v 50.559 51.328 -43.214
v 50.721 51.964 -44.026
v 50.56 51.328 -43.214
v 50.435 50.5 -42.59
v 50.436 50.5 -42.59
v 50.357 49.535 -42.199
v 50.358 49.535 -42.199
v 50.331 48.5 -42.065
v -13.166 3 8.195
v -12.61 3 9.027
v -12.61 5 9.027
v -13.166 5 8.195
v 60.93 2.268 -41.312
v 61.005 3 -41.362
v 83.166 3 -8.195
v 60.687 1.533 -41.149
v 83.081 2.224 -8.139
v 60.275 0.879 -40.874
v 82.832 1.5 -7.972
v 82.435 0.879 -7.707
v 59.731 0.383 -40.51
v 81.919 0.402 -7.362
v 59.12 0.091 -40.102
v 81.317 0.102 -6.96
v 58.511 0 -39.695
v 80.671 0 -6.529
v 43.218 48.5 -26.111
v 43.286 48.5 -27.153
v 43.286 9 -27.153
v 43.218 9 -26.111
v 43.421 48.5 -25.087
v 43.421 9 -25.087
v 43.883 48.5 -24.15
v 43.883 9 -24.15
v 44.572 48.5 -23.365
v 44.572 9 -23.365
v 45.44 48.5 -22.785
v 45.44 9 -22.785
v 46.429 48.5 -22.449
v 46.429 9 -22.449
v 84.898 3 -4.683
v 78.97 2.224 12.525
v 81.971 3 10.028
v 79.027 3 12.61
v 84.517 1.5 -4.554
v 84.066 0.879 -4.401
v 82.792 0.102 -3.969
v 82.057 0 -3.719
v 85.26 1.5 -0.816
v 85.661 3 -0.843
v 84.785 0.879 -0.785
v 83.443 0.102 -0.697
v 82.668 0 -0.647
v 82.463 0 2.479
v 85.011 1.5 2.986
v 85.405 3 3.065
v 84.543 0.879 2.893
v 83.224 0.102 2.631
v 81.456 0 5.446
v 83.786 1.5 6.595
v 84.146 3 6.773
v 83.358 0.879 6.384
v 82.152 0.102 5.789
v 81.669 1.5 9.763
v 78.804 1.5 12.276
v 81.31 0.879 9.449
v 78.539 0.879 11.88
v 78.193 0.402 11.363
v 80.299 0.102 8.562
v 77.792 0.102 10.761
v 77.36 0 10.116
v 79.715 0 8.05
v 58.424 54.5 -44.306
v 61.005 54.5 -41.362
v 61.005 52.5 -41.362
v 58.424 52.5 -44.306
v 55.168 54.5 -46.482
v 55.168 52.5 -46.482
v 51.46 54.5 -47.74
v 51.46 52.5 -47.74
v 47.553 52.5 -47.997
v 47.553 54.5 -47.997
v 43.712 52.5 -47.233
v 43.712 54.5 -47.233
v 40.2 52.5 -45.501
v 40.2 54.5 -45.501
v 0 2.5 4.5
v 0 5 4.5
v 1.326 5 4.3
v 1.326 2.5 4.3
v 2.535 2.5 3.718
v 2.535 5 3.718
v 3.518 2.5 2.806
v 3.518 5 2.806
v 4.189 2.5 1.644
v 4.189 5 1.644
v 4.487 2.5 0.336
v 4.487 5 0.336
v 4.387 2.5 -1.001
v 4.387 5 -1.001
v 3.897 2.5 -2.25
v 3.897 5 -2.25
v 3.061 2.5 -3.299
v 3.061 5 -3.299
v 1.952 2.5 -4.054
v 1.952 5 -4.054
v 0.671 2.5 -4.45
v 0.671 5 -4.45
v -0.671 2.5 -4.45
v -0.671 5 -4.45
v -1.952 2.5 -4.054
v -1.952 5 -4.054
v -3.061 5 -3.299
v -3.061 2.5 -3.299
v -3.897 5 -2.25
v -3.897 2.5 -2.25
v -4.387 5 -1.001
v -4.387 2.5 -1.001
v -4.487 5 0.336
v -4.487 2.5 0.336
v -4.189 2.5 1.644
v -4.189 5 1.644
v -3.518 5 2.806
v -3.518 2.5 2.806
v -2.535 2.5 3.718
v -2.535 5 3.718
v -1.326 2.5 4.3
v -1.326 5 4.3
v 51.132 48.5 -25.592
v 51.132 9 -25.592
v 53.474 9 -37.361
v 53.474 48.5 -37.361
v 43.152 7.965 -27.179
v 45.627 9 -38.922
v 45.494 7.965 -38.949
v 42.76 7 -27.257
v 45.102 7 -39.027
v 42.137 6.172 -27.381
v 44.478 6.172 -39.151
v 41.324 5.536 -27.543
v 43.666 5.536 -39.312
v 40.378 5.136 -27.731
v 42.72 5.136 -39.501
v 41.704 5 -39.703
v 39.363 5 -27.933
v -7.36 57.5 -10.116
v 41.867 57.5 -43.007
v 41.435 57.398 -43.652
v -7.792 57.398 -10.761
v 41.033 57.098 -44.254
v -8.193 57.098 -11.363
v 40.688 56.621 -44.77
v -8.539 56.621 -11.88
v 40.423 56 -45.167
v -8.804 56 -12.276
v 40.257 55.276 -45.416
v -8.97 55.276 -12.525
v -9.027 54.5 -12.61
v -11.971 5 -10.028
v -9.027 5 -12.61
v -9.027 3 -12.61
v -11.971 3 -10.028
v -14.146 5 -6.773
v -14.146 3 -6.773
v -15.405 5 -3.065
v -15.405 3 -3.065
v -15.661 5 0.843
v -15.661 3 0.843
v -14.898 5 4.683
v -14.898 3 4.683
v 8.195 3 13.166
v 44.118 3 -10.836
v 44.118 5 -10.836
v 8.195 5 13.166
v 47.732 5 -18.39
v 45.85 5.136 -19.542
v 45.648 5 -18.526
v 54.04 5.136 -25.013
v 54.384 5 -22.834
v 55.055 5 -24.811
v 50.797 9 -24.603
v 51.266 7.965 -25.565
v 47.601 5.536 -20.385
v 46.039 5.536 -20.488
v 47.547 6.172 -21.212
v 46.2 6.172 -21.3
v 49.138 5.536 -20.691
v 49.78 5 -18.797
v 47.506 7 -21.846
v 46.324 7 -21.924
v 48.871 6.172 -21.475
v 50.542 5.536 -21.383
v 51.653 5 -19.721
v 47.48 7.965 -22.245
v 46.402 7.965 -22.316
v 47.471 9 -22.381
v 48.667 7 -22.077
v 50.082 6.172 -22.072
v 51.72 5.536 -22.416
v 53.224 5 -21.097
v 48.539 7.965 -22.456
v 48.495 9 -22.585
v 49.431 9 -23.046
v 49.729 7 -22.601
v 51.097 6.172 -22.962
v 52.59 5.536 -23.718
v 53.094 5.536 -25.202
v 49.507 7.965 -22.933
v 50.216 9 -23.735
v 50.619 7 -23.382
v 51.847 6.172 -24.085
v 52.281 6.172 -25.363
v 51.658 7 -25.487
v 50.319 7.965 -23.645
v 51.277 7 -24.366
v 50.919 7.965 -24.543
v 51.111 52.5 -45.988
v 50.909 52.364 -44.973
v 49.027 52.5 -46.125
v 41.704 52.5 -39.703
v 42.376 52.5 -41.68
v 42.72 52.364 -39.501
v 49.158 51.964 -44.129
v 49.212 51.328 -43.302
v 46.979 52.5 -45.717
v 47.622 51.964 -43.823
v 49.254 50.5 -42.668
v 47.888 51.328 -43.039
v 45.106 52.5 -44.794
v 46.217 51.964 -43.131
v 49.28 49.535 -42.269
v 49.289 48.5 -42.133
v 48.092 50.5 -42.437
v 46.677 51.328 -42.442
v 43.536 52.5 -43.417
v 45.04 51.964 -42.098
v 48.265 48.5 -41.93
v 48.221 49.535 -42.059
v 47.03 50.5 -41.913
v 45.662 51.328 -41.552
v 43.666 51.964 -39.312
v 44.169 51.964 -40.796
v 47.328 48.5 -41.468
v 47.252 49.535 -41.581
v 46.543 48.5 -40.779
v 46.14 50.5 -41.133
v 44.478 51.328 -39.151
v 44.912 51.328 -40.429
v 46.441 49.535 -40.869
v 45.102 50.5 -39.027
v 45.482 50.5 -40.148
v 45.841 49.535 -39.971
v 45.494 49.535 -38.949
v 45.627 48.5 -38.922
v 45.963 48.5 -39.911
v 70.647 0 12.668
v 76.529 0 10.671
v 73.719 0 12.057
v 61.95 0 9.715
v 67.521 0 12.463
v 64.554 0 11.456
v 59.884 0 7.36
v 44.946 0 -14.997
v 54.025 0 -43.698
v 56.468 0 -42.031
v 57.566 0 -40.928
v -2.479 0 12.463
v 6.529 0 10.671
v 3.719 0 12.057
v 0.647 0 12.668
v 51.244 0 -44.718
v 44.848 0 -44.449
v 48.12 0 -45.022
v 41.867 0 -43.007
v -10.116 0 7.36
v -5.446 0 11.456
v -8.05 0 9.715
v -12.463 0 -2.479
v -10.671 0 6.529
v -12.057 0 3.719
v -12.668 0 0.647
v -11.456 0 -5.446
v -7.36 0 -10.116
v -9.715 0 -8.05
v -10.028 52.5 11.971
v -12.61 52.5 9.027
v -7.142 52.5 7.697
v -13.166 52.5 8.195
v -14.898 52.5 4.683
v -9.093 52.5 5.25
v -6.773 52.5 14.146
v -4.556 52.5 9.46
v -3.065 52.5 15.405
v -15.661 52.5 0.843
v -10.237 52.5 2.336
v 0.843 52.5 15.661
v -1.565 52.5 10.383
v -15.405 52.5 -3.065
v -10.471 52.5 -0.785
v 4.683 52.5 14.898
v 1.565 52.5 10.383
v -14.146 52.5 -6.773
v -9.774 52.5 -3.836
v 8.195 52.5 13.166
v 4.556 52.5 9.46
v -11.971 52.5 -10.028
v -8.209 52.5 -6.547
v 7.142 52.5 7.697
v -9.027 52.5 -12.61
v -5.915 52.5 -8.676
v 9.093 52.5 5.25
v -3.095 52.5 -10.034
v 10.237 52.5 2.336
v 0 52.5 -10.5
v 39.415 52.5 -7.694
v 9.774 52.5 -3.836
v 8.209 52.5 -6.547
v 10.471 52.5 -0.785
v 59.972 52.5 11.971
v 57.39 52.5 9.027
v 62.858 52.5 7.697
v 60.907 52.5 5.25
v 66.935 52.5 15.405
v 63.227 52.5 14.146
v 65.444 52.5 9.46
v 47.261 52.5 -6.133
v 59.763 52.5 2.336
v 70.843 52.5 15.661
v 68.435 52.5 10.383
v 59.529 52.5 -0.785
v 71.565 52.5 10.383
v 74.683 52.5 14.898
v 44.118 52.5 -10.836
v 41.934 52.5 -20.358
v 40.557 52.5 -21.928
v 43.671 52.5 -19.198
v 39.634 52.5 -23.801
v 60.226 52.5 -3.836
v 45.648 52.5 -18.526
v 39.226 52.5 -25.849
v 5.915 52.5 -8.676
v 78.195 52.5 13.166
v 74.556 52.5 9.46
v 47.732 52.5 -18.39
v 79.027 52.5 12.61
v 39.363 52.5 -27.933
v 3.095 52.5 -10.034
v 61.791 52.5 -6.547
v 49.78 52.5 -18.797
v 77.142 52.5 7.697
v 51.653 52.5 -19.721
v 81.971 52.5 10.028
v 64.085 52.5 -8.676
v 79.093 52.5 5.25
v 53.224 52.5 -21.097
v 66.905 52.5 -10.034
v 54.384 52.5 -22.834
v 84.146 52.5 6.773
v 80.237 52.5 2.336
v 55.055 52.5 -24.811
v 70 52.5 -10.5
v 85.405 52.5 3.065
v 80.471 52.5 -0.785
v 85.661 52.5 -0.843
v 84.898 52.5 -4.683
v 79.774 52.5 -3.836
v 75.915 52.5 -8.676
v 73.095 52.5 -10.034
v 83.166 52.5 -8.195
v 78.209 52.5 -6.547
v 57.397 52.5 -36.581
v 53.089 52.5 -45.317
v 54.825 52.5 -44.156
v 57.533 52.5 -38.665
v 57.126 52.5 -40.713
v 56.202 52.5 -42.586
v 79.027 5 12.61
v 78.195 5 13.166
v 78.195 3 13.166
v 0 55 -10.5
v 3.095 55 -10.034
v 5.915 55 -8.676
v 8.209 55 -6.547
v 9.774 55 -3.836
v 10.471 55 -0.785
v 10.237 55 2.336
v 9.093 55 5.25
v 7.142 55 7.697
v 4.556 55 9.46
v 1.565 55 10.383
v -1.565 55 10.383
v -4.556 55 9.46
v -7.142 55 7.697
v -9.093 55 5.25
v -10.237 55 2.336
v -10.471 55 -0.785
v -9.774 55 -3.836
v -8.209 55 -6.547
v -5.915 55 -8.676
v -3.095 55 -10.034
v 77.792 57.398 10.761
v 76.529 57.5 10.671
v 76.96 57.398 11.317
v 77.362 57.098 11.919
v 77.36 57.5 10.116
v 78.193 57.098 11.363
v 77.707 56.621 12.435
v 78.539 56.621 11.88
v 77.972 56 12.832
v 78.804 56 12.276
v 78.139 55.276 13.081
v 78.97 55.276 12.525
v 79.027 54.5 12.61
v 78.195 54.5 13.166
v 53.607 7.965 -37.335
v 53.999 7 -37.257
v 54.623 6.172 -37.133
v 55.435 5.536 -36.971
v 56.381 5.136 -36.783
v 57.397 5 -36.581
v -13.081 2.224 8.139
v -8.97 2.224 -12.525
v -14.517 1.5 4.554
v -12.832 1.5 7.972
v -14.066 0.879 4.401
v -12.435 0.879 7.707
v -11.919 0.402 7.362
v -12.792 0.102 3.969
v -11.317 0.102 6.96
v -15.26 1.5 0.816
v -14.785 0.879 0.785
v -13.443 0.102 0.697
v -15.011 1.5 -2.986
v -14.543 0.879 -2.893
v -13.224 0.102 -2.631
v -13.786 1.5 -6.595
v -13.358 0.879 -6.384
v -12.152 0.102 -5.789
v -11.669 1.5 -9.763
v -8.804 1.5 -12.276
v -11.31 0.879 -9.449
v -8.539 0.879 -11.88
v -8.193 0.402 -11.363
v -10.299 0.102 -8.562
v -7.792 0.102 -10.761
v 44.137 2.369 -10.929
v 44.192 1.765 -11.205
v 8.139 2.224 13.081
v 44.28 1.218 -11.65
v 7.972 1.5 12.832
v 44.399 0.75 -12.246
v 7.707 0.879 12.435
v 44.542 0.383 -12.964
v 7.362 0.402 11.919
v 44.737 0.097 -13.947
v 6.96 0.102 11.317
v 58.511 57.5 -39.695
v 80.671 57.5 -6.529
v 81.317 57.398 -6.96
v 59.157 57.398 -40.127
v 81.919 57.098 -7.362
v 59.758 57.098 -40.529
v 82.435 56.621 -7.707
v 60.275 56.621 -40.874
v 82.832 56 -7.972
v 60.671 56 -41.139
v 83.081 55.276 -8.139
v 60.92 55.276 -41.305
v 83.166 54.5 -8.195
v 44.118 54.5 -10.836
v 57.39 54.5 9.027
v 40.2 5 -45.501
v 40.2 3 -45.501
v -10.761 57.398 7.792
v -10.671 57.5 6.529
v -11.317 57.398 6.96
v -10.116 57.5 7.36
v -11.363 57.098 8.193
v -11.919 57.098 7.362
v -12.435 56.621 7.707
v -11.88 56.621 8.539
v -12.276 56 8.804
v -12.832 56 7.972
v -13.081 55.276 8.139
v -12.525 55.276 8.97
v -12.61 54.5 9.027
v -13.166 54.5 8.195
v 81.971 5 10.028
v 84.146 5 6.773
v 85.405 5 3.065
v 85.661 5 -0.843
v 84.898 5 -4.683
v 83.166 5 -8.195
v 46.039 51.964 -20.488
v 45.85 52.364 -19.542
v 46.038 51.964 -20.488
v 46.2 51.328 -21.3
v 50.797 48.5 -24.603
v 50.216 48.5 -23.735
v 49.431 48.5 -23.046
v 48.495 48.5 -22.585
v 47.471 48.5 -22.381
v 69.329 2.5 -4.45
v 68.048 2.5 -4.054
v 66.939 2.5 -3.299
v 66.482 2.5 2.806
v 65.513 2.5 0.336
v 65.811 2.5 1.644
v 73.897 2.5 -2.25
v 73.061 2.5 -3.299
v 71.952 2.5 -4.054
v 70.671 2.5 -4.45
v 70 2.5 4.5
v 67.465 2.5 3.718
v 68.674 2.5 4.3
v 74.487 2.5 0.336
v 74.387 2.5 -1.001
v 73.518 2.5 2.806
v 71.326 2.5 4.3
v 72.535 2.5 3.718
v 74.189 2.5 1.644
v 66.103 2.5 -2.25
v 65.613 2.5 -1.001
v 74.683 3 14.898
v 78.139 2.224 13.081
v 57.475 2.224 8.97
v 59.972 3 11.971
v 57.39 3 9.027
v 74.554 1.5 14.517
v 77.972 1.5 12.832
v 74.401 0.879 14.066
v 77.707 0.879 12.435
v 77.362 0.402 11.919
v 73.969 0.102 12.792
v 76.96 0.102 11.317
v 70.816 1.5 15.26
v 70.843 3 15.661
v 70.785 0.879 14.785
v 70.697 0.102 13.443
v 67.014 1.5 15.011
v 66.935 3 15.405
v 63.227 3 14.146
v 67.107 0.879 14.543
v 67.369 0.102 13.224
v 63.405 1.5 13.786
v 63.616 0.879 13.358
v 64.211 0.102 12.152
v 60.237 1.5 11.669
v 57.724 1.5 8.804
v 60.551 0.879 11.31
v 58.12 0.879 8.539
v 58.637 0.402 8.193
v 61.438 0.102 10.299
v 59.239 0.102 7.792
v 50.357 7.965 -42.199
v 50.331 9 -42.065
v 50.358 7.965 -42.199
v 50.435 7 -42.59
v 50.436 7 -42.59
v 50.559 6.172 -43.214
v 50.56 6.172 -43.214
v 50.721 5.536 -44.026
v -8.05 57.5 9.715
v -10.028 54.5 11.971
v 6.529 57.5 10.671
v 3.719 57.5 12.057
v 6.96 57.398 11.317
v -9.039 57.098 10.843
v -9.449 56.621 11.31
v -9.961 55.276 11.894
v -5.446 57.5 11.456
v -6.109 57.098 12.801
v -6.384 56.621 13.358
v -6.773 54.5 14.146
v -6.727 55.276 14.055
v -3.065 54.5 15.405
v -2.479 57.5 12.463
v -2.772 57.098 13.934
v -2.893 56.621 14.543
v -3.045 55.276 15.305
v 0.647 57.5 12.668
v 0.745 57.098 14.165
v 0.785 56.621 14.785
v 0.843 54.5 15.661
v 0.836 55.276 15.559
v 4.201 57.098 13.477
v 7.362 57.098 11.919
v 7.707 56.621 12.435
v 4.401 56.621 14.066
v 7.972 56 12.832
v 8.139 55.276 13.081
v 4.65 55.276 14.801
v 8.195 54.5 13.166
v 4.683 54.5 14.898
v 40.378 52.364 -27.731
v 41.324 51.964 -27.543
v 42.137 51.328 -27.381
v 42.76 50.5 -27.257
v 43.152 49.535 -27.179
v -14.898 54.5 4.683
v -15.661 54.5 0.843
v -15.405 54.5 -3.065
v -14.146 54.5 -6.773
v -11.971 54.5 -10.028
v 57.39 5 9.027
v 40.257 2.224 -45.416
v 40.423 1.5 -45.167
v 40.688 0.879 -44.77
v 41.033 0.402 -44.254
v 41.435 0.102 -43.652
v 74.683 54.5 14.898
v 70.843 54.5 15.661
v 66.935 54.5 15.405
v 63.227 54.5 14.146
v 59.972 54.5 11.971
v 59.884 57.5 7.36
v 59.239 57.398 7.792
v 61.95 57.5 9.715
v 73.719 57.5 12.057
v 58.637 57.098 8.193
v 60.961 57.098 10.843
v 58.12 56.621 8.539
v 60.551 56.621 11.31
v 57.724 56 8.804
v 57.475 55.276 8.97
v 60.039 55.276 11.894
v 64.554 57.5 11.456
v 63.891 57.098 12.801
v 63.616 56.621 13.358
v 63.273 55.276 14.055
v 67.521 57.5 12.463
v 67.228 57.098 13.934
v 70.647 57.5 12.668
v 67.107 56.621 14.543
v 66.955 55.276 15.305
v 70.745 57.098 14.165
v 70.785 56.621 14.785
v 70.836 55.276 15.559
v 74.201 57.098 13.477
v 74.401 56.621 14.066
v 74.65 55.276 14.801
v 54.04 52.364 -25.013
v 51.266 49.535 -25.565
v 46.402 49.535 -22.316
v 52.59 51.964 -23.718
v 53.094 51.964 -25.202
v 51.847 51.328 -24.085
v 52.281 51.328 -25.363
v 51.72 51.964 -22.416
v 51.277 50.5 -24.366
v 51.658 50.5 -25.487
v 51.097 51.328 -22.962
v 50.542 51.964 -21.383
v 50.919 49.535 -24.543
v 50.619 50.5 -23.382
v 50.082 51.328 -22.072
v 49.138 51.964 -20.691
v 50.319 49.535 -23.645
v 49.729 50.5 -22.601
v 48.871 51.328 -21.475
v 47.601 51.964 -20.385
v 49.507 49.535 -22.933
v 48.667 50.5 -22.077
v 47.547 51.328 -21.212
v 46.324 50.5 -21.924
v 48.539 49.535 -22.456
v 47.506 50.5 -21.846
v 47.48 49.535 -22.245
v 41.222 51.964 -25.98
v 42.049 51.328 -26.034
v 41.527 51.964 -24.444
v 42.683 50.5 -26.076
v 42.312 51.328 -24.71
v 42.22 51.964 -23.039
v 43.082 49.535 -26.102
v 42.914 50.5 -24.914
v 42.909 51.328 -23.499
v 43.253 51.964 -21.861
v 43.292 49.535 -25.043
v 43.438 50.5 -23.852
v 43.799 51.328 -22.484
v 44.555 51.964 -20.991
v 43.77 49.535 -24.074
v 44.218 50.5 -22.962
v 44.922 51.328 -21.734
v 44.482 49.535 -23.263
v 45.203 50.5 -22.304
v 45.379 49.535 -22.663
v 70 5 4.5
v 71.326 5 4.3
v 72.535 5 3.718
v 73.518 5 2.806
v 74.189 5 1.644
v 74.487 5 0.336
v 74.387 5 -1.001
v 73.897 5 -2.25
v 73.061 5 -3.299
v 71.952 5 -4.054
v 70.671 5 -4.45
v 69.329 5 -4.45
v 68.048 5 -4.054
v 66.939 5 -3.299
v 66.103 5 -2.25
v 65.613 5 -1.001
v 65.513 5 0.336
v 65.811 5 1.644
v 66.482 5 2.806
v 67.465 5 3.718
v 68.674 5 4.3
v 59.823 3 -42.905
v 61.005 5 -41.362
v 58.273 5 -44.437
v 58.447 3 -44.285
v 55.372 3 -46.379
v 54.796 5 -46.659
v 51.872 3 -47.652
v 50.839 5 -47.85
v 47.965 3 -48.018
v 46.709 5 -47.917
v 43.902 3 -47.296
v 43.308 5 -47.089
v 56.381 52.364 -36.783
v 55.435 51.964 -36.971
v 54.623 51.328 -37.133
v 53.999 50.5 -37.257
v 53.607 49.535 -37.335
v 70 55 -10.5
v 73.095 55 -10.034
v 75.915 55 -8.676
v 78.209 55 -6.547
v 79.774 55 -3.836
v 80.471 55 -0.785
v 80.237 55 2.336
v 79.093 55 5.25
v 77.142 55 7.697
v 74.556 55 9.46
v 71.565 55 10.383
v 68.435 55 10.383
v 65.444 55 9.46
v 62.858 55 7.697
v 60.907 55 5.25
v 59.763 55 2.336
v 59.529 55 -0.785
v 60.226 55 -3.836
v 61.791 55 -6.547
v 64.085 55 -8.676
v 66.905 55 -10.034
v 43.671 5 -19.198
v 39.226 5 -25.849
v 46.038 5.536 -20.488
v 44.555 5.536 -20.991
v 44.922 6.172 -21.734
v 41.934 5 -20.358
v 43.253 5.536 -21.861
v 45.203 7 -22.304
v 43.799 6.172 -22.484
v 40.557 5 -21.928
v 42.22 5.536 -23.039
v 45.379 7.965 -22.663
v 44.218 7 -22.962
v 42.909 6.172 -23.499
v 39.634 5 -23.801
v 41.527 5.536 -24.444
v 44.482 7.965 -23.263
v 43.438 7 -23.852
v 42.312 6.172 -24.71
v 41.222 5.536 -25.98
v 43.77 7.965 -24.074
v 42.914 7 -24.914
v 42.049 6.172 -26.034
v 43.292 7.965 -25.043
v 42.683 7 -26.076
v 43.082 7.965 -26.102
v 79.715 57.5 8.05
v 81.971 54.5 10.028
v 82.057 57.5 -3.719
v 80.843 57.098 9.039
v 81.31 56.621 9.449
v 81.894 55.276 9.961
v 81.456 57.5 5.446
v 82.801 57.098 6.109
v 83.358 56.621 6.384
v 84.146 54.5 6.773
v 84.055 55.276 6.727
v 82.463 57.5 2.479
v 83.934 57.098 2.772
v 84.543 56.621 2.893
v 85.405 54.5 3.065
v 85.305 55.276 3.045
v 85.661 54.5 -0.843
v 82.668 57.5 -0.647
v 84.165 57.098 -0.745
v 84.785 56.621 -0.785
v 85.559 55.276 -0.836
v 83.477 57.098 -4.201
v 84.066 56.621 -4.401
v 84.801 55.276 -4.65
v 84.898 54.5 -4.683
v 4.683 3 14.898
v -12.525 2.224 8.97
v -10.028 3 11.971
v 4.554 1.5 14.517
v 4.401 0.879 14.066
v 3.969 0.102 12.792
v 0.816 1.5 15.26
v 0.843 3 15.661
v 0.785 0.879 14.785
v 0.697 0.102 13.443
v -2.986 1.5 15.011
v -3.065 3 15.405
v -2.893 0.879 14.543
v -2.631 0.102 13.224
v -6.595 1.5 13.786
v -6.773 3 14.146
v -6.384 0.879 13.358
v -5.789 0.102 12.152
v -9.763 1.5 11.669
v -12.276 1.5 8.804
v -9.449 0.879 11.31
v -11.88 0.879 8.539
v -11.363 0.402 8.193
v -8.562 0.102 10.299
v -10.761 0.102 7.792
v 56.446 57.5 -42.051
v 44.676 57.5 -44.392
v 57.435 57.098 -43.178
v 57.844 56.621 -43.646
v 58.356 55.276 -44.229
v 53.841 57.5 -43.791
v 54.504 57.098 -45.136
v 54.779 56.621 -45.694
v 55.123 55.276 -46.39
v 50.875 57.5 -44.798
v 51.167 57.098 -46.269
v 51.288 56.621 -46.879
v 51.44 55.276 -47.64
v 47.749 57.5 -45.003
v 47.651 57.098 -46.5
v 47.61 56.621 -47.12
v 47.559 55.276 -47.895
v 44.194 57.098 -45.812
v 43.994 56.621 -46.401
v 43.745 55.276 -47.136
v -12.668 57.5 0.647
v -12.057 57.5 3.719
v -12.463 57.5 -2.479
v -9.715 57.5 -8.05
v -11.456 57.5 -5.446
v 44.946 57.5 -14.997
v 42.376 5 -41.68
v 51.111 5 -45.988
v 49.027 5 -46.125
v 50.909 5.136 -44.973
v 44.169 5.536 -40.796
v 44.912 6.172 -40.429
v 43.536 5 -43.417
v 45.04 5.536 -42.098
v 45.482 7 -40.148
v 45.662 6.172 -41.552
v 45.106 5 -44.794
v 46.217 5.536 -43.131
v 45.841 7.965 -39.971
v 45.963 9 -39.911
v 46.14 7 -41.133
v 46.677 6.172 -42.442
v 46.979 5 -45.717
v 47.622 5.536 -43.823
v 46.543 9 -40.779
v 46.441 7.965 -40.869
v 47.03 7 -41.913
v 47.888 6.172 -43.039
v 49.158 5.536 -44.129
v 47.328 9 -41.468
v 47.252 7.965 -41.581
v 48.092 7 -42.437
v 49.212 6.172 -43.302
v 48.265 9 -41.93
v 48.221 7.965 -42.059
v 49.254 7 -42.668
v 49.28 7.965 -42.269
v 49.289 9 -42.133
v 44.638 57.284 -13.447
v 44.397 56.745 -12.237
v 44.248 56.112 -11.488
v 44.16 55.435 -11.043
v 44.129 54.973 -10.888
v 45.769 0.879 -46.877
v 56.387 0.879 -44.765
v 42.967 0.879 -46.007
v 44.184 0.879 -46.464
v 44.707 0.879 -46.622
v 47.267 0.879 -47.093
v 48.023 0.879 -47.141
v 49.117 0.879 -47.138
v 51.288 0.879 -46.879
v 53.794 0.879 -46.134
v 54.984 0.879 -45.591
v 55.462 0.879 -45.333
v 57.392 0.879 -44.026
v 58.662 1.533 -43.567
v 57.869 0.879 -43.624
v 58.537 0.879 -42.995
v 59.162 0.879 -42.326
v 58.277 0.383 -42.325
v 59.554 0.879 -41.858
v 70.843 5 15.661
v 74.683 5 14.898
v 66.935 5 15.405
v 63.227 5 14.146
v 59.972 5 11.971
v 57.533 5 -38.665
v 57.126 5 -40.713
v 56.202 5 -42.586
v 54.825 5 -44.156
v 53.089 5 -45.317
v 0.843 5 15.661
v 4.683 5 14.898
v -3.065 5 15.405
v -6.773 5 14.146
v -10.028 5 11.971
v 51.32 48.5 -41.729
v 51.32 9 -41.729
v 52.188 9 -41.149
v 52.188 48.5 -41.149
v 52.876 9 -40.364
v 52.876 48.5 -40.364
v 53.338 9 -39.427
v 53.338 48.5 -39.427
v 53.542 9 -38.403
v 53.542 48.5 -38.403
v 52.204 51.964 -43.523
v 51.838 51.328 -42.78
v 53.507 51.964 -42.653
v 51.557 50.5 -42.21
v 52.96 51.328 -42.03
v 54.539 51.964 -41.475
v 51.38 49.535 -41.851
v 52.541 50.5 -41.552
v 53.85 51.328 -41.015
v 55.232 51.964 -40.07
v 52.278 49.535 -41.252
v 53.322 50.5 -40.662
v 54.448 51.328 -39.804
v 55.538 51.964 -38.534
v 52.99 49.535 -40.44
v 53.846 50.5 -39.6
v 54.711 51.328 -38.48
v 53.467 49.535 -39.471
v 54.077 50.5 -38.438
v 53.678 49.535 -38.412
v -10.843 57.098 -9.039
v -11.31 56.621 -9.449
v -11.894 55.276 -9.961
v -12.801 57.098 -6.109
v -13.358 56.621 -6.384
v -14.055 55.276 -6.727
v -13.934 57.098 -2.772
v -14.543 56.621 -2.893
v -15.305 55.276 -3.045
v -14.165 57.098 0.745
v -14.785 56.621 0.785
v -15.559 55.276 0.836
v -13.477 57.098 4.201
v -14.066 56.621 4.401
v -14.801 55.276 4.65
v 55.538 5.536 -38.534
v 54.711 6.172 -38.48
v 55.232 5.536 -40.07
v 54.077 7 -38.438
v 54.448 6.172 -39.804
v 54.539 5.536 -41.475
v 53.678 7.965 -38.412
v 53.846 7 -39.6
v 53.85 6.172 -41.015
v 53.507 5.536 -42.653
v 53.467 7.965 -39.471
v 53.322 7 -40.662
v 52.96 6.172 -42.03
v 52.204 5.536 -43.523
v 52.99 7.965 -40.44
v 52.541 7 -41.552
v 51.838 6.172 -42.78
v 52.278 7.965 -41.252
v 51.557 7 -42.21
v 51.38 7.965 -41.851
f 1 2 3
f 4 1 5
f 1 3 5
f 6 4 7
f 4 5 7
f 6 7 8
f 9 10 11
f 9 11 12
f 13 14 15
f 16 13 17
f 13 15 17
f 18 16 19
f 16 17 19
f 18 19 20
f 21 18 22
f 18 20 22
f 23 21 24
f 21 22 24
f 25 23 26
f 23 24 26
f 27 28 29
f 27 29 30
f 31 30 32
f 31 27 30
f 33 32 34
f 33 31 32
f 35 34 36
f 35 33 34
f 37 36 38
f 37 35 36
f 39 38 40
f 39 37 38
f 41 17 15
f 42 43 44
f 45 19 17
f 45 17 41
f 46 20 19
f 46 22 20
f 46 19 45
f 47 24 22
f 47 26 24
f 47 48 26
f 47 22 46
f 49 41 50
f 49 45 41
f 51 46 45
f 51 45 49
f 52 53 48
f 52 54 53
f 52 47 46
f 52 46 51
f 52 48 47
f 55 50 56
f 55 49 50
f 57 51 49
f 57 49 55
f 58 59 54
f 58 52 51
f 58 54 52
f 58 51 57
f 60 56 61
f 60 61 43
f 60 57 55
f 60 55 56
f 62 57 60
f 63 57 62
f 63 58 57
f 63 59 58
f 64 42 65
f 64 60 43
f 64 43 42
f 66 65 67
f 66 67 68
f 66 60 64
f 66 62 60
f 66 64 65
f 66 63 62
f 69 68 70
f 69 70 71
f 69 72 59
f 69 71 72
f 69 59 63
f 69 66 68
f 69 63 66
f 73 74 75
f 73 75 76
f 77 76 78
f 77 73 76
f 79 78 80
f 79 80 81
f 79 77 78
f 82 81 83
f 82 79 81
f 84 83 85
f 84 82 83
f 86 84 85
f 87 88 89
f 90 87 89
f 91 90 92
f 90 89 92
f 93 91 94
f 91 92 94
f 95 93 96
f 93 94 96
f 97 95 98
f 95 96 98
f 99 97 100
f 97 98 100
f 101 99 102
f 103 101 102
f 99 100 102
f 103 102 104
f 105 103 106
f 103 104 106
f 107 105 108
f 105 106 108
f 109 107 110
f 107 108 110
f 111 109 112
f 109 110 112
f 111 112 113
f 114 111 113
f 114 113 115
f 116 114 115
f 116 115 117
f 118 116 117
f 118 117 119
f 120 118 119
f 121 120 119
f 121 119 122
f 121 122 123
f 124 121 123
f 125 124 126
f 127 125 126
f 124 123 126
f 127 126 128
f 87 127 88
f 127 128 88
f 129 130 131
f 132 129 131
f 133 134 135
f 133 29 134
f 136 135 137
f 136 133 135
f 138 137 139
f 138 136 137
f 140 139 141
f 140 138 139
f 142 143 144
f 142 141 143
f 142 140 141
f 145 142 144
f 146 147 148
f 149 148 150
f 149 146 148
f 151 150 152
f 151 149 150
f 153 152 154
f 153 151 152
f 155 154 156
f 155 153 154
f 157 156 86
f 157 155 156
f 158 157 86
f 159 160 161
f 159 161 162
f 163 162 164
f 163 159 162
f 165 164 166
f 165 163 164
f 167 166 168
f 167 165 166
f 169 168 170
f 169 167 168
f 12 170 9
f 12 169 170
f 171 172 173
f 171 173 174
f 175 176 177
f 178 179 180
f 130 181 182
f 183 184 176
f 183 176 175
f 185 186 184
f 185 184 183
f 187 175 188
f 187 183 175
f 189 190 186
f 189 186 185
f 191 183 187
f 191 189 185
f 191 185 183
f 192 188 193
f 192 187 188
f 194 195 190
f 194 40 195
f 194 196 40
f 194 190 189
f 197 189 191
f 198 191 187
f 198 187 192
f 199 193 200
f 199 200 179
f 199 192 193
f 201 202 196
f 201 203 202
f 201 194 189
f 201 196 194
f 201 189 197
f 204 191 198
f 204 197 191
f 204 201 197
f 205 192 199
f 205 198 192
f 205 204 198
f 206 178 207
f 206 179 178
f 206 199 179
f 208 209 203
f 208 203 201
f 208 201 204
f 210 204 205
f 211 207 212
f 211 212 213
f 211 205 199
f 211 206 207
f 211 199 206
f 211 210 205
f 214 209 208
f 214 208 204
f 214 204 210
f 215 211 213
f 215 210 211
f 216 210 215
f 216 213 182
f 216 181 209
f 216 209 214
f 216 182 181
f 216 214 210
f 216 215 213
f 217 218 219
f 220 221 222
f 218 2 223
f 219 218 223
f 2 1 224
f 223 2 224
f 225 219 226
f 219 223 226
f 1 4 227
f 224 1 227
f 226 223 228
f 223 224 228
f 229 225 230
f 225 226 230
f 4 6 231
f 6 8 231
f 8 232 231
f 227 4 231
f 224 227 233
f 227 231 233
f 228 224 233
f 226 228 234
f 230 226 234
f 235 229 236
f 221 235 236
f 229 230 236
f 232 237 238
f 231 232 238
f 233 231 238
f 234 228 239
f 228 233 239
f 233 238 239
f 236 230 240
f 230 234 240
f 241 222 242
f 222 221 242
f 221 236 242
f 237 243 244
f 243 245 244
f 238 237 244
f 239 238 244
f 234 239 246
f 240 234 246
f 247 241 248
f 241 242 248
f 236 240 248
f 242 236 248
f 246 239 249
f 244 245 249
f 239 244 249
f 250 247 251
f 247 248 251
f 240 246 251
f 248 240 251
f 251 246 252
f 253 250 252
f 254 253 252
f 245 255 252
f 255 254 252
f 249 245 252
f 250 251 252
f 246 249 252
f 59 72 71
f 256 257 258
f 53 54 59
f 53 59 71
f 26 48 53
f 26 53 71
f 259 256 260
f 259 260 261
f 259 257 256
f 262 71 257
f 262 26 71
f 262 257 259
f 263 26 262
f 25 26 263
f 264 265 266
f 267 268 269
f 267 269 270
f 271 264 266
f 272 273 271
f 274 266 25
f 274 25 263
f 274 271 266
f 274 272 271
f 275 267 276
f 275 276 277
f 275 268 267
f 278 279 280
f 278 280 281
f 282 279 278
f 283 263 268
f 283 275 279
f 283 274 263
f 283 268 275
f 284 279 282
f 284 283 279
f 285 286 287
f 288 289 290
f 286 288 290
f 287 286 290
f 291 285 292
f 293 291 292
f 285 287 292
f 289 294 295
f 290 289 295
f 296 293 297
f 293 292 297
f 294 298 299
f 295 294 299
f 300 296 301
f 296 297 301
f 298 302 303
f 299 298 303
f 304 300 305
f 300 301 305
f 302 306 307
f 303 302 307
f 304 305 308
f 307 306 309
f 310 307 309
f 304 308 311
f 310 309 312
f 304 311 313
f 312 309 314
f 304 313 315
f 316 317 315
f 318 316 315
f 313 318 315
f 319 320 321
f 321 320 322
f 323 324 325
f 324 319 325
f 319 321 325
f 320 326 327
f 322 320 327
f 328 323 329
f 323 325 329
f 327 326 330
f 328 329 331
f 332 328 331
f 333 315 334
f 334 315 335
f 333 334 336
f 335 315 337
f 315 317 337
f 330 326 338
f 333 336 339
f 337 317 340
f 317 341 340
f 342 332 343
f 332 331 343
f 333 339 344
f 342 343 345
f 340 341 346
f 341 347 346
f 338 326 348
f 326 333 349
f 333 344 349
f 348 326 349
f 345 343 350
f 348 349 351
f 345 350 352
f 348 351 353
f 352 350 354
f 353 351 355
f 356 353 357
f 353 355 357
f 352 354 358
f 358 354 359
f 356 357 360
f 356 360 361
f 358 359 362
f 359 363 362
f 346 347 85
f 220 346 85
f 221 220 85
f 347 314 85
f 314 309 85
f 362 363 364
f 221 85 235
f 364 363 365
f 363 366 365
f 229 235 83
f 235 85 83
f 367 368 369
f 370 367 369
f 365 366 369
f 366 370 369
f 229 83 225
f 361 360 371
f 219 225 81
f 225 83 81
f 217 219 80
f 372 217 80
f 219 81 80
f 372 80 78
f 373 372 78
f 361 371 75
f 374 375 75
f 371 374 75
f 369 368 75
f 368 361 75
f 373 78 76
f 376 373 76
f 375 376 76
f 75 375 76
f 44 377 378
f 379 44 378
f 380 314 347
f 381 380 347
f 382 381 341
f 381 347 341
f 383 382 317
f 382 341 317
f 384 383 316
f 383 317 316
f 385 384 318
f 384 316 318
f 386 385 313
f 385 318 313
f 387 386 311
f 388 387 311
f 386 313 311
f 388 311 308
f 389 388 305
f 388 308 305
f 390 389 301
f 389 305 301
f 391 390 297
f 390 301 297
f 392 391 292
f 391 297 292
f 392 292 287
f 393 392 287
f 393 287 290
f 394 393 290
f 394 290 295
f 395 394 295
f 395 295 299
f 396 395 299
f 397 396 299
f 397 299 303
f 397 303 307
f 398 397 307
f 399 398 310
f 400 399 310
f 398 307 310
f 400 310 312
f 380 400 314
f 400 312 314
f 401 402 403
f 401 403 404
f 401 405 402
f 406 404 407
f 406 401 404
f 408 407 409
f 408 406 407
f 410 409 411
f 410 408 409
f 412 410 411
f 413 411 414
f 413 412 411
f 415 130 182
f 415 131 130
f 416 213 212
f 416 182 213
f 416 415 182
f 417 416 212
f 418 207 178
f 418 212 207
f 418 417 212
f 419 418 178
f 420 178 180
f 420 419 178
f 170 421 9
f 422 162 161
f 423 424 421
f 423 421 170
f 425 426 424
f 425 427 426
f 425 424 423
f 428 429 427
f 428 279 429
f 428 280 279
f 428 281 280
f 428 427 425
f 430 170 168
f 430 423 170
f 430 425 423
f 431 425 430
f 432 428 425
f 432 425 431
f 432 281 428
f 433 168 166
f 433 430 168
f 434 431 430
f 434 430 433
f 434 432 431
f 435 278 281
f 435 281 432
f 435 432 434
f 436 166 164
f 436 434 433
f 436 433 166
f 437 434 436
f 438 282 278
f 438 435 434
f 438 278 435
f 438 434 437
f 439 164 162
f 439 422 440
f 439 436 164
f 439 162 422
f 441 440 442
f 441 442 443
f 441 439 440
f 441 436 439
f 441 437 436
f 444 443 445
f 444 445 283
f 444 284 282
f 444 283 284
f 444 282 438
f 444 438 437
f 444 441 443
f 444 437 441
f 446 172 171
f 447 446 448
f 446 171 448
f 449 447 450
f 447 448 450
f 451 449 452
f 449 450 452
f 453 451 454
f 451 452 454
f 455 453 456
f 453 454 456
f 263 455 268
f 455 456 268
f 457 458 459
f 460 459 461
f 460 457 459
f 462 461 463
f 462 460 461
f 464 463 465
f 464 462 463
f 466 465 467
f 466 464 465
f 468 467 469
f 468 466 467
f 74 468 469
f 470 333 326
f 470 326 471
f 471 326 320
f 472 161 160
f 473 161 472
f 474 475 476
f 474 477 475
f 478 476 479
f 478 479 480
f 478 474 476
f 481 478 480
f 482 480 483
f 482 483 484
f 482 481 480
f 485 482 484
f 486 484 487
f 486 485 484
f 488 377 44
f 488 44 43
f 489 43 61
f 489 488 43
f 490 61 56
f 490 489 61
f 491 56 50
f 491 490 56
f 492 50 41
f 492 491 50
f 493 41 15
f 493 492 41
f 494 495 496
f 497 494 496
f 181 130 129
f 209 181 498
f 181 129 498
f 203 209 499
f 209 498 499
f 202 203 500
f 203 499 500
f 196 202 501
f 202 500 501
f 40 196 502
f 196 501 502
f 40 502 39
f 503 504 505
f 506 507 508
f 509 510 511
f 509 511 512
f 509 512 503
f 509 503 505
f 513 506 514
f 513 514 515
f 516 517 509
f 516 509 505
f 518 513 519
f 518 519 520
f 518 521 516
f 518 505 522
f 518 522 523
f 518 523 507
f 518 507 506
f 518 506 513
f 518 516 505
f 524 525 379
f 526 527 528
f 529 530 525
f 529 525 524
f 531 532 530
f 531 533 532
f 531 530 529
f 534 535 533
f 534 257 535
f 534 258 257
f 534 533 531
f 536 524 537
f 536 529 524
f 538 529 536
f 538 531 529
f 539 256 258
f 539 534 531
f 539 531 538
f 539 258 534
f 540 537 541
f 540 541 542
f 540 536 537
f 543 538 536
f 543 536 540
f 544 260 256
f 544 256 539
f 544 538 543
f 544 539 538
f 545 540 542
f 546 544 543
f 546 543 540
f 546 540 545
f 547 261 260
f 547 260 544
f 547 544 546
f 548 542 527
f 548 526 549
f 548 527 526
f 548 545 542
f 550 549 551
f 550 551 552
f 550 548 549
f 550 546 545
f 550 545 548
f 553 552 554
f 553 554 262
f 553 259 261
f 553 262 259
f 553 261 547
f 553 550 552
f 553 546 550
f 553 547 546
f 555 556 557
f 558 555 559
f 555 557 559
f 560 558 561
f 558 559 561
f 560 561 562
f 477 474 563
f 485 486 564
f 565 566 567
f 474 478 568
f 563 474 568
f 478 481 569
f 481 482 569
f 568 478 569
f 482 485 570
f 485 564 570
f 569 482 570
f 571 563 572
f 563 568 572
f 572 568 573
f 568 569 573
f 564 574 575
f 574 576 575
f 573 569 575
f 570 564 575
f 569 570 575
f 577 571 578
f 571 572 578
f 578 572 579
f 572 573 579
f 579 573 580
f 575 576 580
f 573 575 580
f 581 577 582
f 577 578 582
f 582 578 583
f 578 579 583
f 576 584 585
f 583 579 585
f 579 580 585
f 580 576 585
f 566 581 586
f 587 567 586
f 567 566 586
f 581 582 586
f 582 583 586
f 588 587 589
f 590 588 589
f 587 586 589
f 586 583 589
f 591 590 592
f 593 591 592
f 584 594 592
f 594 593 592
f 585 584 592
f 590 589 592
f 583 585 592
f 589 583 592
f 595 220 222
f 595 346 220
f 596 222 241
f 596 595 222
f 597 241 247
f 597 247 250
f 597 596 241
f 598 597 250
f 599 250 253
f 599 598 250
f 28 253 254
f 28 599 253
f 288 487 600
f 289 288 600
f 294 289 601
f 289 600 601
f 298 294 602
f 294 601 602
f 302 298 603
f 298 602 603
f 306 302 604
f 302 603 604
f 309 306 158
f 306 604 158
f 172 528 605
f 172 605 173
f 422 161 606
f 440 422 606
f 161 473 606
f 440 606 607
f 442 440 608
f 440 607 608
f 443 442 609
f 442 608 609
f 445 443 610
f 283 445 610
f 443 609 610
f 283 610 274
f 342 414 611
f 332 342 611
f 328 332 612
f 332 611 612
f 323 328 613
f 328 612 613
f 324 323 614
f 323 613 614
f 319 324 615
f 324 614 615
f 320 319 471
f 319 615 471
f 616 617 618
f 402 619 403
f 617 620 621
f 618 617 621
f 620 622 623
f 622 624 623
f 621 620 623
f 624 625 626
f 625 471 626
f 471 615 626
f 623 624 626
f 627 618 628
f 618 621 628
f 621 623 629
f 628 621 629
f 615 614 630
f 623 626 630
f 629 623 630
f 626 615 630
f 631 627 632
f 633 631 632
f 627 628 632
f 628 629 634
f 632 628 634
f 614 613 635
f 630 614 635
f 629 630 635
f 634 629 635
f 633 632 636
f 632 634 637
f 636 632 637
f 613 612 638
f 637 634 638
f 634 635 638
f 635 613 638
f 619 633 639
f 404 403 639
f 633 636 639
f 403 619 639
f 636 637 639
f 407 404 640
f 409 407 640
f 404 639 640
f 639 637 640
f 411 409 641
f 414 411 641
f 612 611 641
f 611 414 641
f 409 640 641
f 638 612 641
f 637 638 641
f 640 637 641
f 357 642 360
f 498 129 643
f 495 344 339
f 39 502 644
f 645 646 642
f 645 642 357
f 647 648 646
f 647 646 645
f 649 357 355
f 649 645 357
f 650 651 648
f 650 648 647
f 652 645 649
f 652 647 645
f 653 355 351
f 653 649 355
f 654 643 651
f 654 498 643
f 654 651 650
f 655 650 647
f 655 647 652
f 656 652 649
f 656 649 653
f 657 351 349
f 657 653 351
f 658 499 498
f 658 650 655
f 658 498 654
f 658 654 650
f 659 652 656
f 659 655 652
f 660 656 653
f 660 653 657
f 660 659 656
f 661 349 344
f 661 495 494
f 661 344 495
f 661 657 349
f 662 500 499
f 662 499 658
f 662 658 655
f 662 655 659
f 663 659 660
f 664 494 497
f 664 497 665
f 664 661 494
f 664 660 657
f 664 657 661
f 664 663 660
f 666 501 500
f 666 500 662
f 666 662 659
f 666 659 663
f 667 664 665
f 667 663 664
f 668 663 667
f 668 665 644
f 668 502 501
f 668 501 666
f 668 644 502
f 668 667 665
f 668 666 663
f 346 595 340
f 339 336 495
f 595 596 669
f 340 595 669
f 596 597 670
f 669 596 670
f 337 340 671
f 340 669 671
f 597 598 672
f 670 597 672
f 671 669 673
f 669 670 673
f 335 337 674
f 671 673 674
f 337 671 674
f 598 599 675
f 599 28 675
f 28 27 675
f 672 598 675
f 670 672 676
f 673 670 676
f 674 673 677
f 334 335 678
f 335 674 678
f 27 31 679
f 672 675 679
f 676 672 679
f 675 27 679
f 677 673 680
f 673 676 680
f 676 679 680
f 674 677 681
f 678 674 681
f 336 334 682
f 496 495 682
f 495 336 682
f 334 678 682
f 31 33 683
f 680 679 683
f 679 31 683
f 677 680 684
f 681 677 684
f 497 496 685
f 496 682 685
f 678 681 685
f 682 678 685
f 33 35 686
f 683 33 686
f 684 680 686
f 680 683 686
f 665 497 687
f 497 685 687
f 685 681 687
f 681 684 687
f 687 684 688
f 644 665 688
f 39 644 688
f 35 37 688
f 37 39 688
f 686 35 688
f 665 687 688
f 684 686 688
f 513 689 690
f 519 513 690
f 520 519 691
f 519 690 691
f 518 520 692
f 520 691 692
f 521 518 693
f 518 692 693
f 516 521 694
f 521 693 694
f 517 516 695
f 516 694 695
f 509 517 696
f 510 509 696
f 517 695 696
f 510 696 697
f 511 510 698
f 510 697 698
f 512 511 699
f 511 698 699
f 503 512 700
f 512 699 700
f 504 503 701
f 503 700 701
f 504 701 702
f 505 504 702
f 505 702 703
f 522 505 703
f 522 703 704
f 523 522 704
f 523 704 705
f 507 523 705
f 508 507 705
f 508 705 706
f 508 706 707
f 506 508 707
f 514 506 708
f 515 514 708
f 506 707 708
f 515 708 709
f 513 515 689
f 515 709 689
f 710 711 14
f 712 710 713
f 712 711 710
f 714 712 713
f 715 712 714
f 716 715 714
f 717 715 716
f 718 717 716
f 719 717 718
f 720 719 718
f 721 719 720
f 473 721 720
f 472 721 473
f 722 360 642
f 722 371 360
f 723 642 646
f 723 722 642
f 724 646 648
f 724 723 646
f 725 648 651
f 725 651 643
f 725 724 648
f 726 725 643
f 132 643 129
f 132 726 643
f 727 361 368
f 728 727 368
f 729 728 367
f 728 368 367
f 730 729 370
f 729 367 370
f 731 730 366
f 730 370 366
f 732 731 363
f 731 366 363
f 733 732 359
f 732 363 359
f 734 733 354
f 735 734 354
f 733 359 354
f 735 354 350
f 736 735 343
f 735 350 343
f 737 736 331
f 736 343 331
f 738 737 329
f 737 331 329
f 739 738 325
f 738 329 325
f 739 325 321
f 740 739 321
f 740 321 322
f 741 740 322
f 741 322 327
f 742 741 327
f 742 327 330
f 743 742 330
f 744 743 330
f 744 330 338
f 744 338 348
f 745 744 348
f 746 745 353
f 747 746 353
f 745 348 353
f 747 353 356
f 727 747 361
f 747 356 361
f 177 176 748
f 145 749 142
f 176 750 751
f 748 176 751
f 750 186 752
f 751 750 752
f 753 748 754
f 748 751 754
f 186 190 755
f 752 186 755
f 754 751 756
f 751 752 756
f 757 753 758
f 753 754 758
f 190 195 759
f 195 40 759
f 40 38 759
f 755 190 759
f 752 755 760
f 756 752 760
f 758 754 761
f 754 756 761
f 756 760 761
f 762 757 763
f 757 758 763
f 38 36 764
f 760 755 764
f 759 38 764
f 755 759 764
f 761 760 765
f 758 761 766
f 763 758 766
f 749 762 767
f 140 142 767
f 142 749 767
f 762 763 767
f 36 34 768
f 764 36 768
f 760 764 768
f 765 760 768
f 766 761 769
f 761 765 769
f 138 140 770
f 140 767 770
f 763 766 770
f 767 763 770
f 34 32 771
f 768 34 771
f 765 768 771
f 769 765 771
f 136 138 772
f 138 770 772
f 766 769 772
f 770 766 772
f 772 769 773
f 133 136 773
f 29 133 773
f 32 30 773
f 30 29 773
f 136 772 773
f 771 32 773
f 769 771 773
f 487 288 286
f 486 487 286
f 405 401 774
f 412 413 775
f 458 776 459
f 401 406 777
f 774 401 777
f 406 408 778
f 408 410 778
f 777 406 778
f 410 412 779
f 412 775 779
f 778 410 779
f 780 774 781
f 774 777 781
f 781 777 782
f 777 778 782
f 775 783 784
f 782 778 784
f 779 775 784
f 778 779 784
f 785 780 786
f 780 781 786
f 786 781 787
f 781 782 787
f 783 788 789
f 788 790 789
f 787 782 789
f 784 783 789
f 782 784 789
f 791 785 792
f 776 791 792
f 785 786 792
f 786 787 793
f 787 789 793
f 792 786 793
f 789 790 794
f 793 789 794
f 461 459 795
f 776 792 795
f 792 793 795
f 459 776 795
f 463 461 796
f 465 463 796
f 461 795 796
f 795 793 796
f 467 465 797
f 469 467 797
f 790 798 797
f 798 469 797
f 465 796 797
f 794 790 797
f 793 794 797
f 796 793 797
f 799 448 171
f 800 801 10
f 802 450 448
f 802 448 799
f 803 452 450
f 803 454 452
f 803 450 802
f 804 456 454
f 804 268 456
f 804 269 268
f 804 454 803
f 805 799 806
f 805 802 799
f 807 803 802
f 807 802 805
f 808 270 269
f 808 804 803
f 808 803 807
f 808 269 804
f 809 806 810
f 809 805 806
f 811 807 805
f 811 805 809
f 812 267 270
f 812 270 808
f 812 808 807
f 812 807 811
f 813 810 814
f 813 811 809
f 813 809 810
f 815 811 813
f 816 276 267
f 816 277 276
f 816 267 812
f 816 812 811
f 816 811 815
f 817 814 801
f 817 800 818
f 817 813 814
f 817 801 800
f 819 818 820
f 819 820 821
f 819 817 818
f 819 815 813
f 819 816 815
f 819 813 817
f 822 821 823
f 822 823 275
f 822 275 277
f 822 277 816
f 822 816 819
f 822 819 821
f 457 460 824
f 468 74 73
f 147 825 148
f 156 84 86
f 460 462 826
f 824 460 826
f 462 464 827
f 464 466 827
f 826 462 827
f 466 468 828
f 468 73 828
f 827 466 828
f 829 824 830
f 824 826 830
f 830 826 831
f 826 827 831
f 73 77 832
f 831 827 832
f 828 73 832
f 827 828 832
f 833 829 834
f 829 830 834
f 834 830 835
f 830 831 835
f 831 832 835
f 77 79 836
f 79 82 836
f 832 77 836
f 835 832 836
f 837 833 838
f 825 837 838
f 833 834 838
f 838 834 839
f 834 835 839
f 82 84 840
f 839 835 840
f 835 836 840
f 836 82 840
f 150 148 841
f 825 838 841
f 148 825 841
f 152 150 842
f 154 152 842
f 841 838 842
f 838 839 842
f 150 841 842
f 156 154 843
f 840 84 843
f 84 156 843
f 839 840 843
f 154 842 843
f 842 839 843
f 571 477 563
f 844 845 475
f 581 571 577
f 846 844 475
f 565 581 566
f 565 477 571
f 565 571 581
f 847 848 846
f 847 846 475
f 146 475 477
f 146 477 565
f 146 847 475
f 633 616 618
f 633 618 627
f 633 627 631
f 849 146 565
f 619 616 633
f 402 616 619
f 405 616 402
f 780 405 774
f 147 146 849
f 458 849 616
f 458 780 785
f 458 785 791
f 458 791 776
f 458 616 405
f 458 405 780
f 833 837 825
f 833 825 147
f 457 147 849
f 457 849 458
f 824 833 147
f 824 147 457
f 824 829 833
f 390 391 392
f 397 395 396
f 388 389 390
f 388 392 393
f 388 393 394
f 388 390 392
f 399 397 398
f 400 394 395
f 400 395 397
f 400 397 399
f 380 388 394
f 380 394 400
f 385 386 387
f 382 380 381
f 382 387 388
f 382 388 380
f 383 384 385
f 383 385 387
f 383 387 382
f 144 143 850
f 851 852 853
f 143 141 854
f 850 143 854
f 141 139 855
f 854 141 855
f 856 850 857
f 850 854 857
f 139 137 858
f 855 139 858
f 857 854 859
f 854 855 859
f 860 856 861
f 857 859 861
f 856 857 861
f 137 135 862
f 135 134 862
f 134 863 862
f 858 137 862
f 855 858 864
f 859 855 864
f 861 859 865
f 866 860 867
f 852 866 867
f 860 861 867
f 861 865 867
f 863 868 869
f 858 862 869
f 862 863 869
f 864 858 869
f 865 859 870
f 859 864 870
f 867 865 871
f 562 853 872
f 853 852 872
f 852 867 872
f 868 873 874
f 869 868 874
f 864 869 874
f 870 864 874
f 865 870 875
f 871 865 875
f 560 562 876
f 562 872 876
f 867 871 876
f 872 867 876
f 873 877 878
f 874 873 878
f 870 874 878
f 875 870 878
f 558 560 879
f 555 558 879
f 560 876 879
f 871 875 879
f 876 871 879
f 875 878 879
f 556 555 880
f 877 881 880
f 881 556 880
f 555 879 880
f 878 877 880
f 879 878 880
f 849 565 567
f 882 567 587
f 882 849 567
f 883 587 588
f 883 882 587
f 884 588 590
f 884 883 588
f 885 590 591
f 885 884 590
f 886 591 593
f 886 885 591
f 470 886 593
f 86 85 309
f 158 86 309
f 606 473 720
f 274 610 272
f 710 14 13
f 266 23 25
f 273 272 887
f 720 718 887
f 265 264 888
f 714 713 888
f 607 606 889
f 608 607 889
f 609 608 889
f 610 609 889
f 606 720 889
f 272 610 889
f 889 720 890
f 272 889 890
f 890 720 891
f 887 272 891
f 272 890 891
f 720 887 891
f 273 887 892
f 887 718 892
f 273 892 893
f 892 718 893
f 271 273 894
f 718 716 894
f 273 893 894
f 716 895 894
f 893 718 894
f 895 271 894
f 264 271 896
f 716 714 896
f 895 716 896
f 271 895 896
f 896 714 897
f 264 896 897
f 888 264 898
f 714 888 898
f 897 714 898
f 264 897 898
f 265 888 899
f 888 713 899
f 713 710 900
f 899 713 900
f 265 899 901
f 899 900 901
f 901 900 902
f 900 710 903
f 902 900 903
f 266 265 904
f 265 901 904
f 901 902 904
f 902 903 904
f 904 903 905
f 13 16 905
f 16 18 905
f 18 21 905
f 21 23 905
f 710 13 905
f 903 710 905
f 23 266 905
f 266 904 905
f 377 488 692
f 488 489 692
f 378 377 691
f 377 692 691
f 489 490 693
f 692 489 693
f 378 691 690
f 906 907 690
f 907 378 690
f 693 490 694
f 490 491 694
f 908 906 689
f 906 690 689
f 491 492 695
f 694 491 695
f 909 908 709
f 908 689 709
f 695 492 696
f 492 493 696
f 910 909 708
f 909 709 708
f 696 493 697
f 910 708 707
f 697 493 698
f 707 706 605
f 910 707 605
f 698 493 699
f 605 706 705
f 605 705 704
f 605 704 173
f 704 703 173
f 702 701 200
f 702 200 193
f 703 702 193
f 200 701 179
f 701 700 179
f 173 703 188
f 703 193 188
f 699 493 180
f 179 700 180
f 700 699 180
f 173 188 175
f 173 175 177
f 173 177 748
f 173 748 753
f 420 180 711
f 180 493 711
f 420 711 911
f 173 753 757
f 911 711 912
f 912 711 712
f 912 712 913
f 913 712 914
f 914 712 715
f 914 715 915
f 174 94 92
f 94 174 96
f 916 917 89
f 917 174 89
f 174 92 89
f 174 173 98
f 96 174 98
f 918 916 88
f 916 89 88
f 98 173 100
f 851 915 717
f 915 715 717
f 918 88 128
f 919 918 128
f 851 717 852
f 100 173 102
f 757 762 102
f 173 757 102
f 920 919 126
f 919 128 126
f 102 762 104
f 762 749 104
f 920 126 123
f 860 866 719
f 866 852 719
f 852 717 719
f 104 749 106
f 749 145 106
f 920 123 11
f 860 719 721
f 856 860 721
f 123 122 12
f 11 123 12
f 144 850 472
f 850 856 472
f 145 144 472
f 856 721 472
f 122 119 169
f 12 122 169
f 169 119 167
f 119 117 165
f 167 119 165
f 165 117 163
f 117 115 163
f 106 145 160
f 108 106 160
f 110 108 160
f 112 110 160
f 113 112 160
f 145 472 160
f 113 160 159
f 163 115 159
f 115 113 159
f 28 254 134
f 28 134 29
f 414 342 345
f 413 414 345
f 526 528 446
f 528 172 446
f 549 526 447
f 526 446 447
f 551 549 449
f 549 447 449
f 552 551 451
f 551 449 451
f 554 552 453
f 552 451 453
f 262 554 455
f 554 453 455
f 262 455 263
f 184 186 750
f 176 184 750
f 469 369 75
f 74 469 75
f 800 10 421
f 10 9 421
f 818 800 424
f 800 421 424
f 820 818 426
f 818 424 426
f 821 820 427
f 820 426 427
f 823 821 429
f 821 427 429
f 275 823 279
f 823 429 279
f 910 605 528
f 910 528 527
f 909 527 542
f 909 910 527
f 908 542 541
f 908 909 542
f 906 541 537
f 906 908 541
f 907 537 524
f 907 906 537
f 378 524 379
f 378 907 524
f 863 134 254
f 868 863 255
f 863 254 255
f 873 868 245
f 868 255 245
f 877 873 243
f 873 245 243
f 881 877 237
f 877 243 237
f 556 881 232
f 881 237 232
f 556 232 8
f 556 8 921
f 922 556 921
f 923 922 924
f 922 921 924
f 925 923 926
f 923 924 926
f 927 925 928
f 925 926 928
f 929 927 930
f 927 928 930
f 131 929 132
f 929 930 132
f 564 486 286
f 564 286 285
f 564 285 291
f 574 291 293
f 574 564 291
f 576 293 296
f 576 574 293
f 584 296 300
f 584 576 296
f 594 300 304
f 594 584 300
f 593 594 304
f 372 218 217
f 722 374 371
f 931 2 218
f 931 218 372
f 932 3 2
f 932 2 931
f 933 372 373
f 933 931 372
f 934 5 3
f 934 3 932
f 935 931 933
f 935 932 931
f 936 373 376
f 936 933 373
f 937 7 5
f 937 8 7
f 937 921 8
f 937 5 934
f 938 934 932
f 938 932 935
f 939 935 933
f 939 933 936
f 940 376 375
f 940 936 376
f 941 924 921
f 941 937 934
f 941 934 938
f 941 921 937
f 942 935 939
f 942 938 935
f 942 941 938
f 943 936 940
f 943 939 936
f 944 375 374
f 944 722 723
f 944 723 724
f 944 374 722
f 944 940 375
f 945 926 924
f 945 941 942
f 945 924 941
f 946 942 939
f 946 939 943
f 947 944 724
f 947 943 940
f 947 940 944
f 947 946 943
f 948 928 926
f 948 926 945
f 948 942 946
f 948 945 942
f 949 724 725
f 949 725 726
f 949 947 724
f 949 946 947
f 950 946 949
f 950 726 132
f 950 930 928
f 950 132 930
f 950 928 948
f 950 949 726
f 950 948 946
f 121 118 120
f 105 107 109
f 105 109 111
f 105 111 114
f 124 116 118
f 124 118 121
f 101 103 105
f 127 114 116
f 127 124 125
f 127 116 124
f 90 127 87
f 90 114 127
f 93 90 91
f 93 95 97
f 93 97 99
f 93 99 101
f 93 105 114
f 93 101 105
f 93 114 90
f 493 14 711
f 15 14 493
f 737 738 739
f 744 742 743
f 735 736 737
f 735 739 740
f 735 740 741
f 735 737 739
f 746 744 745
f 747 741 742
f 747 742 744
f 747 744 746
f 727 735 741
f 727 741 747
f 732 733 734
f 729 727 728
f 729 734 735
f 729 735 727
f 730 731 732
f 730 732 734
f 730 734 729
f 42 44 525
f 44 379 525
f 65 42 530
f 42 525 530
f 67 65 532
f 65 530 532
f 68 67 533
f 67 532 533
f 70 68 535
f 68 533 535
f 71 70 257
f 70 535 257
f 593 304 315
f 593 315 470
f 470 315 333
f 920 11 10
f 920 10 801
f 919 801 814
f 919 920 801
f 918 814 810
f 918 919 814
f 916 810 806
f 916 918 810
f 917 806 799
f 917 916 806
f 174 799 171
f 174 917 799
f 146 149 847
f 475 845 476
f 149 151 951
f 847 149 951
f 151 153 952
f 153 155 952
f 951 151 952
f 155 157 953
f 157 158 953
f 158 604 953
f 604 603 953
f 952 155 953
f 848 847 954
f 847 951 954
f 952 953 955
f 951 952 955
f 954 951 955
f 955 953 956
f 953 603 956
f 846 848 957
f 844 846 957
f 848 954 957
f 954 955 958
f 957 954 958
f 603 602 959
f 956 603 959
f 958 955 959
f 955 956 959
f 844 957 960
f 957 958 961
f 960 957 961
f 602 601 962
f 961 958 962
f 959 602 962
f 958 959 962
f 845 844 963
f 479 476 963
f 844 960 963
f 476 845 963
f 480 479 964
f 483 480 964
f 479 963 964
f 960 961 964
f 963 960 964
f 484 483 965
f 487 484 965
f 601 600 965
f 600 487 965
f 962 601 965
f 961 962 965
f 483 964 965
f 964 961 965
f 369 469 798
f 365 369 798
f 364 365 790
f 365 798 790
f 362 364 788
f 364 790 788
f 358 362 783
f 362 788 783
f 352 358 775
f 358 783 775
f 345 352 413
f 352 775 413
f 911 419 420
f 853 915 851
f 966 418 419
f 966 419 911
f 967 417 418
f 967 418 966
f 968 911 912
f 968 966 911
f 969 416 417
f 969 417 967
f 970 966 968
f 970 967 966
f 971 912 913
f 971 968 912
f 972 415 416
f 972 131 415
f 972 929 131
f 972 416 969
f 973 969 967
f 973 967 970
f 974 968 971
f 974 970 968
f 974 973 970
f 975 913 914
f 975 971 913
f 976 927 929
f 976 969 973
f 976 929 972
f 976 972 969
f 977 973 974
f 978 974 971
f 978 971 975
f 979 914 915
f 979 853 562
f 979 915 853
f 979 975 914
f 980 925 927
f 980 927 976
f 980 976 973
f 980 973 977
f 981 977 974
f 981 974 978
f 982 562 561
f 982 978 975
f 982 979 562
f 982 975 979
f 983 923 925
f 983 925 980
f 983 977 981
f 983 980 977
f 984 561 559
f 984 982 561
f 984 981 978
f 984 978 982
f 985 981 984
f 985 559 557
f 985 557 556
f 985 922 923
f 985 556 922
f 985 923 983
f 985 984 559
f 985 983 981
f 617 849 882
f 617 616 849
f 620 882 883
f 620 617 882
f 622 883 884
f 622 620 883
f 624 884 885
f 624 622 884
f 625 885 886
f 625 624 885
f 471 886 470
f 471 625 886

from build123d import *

# Parameters (mm, degrees)
SALIENTE_EXTRUIR2_DEPTH = 5
CROQUIS2_R              = 4.5
CORTAR_EXTRUIR1_DEPTH   = 2.5
SALIENTE_EXTRUIR3_DEPTH = 47.5
SALIENTE_EXTRUIR4_DEPTH = 5
CROQUIS6_R              = 10.5
CORTAR_EXTRUIR2_DEPTH   = 2.5
CROQUIS7_W              = 26.576799325
CROQUIS7_H              = 47.5
CROQUIS7_W_2            = 20
CORTAR_EXTRUIR3_DEPTH   = 12.5
REDONDEO1_R             = 15
REDONDEO2_R             = 3
REDONDEO3_R             = 4


with BuildPart() as part:
    # Croquis1 → Saliente-Extruir2 (new body)
    with BuildSketch(Plane(origin=(0, 0, 0), x_dir=(1, 0, 0), z_dir=(0, 1, 0))):
        Polygon((-4.276899691, -21.499026234), (-21.499026234, 4.276899691), (40.72350463, 45.850742798), (52.672201475, 53.834237539), (91.499026234, -4.276899691), (65.723100309, -21.499026234), (44.118402092, 10.836185071), align=None)
    extrude(amount=SALIENTE_EXTRUIR2_DEPTH)

    # Croquis2 → Cortar-Extruir1 (cut)
    with BuildSketch(Plane(origin=(0, 5, 0), x_dir=(1, 0, 0), z_dir=(0, 1, 0))):
        with Locations(Location((0, 0, 0), (0, 0, 270))):
            Circle(CROQUIS2_R)
        with Locations(Location((70, 0, 0), (0, 0, 270))):
            Circle(CROQUIS2_R)
    extrude(amount=-CORTAR_EXTRUIR1_DEPTH, mode=Mode.SUBTRACT)

    # Croquis4 → Saliente-Extruir3 (add)
    with BuildSketch(Plane(origin=(0, 5, 0), x_dir=(1, 0, 0), z_dir=(0, 1, 0))):
        Polygon((52.672201475, 53.834237539), (47.968631923, 50.691558194), (39.41483254, 7.693505725), (44.118402092, 10.836185071), (47.261081438, 6.132615519), (55.814880821, 49.130667987), align=None)
    extrude(amount=SALIENTE_EXTRUIR3_DEPTH)

    # Croquis5 → Saliente-Extruir4 (add)
    with BuildSketch(Plane(origin=(0, 52.5, 0), x_dir=(1, 0, 0), z_dir=(0, 1, 0))):
        Polygon((-21.499026234, 4.276899691), (-4.276899691, -21.499026234), (44.118402092, 10.836185071), (65.723100309, -21.499026234), (91.499026234, -4.276899691), (52.672201475, 53.834237539), align=None)
    extrude(amount=SALIENTE_EXTRUIR4_DEPTH)

    # Croquis6 → Cortar-Extruir2 (cut)
    with BuildSketch(Plane.XZ.offset(-52.5)):
        with Locations(Location((0, 0, 0), (0, 0, 270))):
            Circle(CROQUIS6_R)
        with Locations(Location((70, 0, 0), (0, 0, 270))):
            Circle(CROQUIS6_R)
    extrude(amount=-CORTAR_EXTRUIR2_DEPTH, mode=Mode.SUBTRACT)

    # Croquis7 → Cortar-Extruir3 (cut)
    with BuildSketch(Plane(origin=(36.442132095, 0, 7.249600136), x_dir=(-0.19511127576179904, 0, 0.9807811122113861), z_dir=(-0.9807811122113861, 0, -0.19511127576179904))):
        with Locations((-64.364943459, 28.75)):
            Rectangle(CROQUIS7_W, CROQUIS7_H)
        with Locations((-21.076543796, 28.75)):
            Rectangle(CROQUIS7_W_2, CROQUIS7_H)
    extrude(amount=-CORTAR_EXTRUIR3_DEPTH, mode=Mode.SUBTRACT)

    # Redondeo1
    redondeo1_edges = [part.edges().sort_by_distance(p)[0] for p in [
        (-4.276899691, 2.5, 21.499026234),
        (-21.499026234, 2.5, -4.276899691),
        (52.672201475, 55, -53.834237539),
        (91.499026234, 2.5, 4.276899691),
        (65.723100309, 2.5, 21.499026234),
        (-21.499026234, 55, -4.276899691),
        (-4.276899691, 55, 21.499026234),
        (65.723100309, 55, 21.499026234),
        (91.499026234, 55, 4.276899691),
        (52.672201475, 2.5, -53.834237539),
    ]]
    fillet(redondeo1_edges, radius=REDONDEO1_R)

    # Redondeo2
    redondeo2_edges = [part.edges().sort_by_distance(p)[0] for p in [
        (50.754107682, 0, -0.904690529),
        (15.58658762, 0, -29.055568615),
        (26.156862311, 0, 1.164777064),
        (-12.887962963, 0, 8.611063271),
        (72.085613855, 0, -24.778668924),
        (78.611063271, 0, 12.887962963),
        (85.405233658, 0, 3.064633643),
        (66.935366357, 0, 15.405233658),
        (-3.064633643, 0, 15.405233658),
        (-15.405233658, 0, -3.064633643),
        (51.459935426, 0, -47.740444963),
        (15.58658762, 57.5, -29.055568615),
        (72.085613855, 57.5, -24.778668924),
        (-12.887962963, 57.5, 8.611063271),
        (26.156862311, 57.5, 1.164777064),
        (78.611063271, 57.5, 12.887962963),
        (-15.405233658, 57.5, -3.064633643),
        (-3.064633643, 57.5, 15.405233658),
        (66.935366357, 57.5, 15.405233658),
        (85.405233658, 57.5, 3.064633643),
        (51.459935426, 57.5, -47.740444963),
        (50.754107682, 57.5, -0.904690529),
    ]]
    fillet(redondeo2_edges, radius=REDONDEO2_R)

    # Redondeo3
    redondeo3_edges = [part.edges().sort_by_distance(p)[0] for p in [
        (46.42864065, 52.5, -22.449241949),
        (42.505516202, 28.75, -23.229687052),
        (50.351765099, 28.75, -21.668796846),
        (46.42864065, 5, -22.449241949),
        (52.302877857, 52.5, -31.476607968),
        (44.456628959, 52.5, -33.037498174),
        (52.302877857, 5, -31.476607968),
        (44.456628959, 5, -33.037498174),
        (50.330866166, 5, -42.064864193),
        (46.407741717, 28.75, -42.845309296),
        (54.253990614, 28.75, -41.28441909),
        (50.330866166, 52.5, -42.064864193),
    ]]
    fillet(redondeo3_edges, radius=REDONDEO3_R - 0.0001)  # a hair under: the kernel refuses the full size


solid = part.part
